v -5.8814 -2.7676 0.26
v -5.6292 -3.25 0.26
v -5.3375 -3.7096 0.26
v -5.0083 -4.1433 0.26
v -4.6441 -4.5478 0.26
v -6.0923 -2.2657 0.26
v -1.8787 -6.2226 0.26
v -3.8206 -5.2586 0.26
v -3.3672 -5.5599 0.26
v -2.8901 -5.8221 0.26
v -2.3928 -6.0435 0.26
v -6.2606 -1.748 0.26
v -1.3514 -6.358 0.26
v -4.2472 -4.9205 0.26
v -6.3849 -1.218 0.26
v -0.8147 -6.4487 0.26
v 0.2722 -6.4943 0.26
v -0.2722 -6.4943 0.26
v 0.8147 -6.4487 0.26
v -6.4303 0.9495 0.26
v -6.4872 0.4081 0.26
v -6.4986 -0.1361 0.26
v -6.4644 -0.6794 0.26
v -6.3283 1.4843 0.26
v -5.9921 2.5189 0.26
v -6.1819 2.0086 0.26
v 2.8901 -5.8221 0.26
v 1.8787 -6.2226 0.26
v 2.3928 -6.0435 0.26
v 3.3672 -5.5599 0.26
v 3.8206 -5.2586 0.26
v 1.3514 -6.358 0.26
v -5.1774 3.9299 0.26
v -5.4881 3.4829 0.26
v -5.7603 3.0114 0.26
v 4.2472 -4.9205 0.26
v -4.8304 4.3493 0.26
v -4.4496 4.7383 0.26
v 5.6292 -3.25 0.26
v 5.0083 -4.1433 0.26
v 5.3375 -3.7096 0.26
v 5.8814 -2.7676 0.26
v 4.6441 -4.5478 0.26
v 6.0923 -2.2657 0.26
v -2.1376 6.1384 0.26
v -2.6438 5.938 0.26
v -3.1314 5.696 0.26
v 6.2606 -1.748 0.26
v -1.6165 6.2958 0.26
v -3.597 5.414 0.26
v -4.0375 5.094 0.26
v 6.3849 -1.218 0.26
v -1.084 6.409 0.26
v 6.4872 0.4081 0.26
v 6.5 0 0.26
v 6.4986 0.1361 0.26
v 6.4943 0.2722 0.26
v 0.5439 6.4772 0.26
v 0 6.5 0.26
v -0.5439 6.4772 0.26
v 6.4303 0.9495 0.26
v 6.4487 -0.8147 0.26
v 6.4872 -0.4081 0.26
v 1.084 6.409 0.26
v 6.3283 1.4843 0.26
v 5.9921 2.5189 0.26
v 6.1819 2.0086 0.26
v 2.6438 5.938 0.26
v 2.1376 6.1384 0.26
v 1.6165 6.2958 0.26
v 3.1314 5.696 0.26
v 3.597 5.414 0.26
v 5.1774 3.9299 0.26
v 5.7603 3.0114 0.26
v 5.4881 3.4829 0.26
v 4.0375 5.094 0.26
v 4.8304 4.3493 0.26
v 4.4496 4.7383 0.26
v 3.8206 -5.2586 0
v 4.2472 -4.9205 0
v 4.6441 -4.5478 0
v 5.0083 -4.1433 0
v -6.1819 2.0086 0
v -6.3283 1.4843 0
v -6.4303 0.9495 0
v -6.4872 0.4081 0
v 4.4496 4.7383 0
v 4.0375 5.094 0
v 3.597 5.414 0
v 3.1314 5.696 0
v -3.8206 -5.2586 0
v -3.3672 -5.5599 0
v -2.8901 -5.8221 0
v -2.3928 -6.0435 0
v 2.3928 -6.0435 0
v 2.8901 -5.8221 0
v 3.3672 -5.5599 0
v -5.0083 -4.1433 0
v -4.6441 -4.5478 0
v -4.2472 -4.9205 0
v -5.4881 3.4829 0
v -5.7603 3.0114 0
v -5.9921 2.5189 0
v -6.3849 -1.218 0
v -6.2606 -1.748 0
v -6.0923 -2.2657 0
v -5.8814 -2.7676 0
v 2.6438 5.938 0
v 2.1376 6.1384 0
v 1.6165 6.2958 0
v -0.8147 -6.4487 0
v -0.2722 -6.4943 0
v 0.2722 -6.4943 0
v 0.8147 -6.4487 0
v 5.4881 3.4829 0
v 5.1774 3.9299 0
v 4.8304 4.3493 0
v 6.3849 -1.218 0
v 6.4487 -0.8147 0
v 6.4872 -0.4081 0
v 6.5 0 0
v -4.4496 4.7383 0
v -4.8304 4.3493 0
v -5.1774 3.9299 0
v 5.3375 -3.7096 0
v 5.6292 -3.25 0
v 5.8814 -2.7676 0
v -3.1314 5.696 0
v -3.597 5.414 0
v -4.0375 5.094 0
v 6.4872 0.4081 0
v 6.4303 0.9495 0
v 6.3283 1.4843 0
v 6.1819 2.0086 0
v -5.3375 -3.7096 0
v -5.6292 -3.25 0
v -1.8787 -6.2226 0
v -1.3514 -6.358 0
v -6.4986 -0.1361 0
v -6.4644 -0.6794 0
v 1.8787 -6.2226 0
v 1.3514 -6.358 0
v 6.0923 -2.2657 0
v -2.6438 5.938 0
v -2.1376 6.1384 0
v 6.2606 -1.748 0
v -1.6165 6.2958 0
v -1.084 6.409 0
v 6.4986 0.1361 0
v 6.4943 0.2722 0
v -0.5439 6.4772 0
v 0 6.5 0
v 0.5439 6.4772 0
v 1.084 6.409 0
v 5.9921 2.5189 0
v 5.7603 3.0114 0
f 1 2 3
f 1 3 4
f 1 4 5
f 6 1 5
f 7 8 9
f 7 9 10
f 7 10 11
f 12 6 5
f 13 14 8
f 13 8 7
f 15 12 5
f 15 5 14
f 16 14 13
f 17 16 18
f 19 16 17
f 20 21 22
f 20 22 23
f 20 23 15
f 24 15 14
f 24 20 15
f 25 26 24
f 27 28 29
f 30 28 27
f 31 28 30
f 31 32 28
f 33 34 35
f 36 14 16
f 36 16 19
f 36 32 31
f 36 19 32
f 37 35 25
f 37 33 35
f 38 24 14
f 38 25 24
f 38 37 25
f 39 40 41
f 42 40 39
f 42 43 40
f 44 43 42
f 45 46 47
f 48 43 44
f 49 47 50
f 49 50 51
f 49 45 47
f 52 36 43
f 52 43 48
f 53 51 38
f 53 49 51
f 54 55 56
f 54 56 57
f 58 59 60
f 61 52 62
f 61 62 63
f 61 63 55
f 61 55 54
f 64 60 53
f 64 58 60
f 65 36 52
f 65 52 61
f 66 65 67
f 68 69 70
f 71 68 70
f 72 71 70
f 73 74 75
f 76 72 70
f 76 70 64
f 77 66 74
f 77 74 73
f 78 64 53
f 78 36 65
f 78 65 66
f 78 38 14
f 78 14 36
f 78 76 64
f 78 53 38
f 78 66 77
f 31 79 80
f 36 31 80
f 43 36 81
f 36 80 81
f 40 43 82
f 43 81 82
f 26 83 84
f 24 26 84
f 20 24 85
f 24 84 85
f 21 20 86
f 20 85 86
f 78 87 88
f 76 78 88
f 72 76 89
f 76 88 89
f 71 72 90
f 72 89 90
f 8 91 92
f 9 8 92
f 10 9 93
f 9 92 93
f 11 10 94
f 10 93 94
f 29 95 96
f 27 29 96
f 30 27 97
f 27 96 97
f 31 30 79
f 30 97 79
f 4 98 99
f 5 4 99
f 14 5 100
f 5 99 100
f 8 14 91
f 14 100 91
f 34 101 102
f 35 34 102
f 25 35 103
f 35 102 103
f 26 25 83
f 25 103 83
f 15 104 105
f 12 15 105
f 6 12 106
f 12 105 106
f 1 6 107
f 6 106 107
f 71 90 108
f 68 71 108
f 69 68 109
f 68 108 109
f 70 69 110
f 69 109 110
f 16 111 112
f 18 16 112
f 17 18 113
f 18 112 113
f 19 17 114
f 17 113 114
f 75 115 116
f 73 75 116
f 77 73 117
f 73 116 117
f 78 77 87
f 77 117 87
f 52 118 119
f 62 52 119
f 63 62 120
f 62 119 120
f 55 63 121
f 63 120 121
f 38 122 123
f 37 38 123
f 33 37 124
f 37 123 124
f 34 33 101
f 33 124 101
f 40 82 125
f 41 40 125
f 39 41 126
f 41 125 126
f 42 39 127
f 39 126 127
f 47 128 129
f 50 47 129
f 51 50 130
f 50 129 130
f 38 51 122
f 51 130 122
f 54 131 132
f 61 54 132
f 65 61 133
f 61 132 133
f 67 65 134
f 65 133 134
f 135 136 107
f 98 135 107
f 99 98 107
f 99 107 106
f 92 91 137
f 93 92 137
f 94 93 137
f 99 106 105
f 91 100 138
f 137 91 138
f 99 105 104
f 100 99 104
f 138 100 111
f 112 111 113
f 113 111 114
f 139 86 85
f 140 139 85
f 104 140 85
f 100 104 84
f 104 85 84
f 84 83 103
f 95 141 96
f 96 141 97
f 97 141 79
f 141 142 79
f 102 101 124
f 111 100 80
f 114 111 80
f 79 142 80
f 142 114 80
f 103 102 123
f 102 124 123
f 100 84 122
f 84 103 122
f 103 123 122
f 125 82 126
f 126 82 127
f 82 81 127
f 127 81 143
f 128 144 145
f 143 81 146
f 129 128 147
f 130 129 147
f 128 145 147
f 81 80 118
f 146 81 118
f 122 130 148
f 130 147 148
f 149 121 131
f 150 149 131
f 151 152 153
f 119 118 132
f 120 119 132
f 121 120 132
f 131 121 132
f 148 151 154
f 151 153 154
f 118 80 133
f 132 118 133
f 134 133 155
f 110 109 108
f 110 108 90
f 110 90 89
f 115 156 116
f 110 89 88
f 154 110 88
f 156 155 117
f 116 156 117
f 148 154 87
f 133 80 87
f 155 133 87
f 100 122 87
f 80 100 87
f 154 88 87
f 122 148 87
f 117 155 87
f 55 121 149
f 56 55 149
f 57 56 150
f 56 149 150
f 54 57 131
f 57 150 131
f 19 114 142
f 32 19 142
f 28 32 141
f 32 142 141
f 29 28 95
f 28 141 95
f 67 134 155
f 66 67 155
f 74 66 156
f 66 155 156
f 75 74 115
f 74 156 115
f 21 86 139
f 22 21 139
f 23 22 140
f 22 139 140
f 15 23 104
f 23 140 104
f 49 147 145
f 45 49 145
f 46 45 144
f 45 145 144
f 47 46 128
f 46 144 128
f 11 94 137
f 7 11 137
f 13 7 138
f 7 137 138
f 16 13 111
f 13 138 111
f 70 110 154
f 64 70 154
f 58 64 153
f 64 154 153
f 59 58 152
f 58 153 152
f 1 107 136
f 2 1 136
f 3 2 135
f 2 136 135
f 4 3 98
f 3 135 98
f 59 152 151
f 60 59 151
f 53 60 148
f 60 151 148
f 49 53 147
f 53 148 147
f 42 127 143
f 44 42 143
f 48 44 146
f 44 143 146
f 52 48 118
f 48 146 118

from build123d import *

# Parameters (mm, degrees)
F1_DEPTH = 0.26


with BuildPart() as f1:
    # F0 (on Top) → F1 (new body)
    with BuildSketch(Plane.XY):
        with BuildLine():
            ThreePointArc((6.5, 0), (6.4967926424, 0.204169934), (6.4871737348, 0.4081383769))
            ThreePointArc((6.4871737348, 0.4081383769), (6.3848671297, 1.2179785448), (6.1818673559, 2.0086104634))
            ThreePointArc((6.1818673559, 2.0086104634), (5.881375841, 2.7675653952), (5.4881315158, 3.4828741674))
            ThreePointArc((5.4881315158, 3.4828741674), (5.008336078, 4.1432559334), (4.4495561885, 4.7382960782))
            ThreePointArc((4.4495561885, 4.7382960782), (3.8206041399, 5.2586104634), (3.1313988817, 5.6959934203))
            ThreePointArc((3.1313988817, 5.6959934203), (2.3928095925, 6.0435471583), (1.6164842666, 6.2957905473))
            ThreePointArc((1.6164842666, 6.2957905473), (0.8146660182, 6.4487455585), (0, 6.5))
            ThreePointArc((0, 6.5), (-0.8146660182, 6.4487455585), (-1.6164842666, 6.2957905473))
            ThreePointArc((-1.6164842666, 6.2957905473), (-2.3928095925, 6.0435471583), (-3.1313988817, 5.6959934203))
            ThreePointArc((-3.1313988817, 5.6959934203), (-3.8206041399, 5.2586104634), (-4.4495561885, 4.7382960782))
            ThreePointArc((-4.4495561885, 4.7382960782), (-5.008336078, 4.1432559334), (-5.4881315158, 3.4828741674))
            ThreePointArc((-5.4881315158, 3.4828741674), (-5.881375841, 2.7675653952), (-6.1818673559, 2.0086104634))
            ThreePointArc((-6.1818673559, 2.0086104634), (-6.3848671297, 1.2179785448), (-6.4871737348, 0.4081383769))
            ThreePointArc((-6.4871737348, 0.4081383769), (-6.4871737348, -0.4081383769), (-6.3848671297, -1.2179785448))
            ThreePointArc((-6.3848671297, -1.2179785448), (-6.1818673559, -2.0086104634), (-5.881375841, -2.7675653952))
            ThreePointArc((-5.881375841, -2.7675653952), (-5.4881315158, -3.4828741674), (-5.008336078, -4.1432559334))
            ThreePointArc((-5.008336078, -4.1432559334), (-4.4495561885, -4.7382960782), (-3.8206041399, -5.2586104634))
            ThreePointArc((-3.8206041399, -5.2586104634), (-3.1313988817, -5.6959934203), (-2.3928095925, -6.0435471583))
            ThreePointArc((-2.3928095925, -6.0435471583), (-1.6164842666, -6.2957905473), (-0.8146660182, -6.4487455585))
            ThreePointArc((-0.8146660182, -6.4487455585), (0, -6.5), (0.8146660182, -6.4487455585))
            ThreePointArc((0.8146660182, -6.4487455585), (1.6164842666, -6.2957905473), (2.3928095925, -6.0435471583))
            ThreePointArc((2.3928095925, -6.0435471583), (3.1313988817, -5.6959934203), (3.8206041399, -5.2586104634))
            ThreePointArc((3.8206041399, -5.2586104634), (4.4495561885, -4.7382960782), (5.008336078, -4.1432559334))
            ThreePointArc((5.008336078, -4.1432559334), (5.4881315158, -3.4828741674), (5.881375841, -2.7675653952))
            ThreePointArc((5.881375841, -2.7675653952), (6.1818673559, -2.0086104634), (6.3848671297, -1.2179785448))
            ThreePointArc((6.3848671297, -1.2179785448), (6.4711527699, -0.6117040366), (6.5, 0))
        make_face()
    extrude(amount=F1_DEPTH)


solid = f1.part
